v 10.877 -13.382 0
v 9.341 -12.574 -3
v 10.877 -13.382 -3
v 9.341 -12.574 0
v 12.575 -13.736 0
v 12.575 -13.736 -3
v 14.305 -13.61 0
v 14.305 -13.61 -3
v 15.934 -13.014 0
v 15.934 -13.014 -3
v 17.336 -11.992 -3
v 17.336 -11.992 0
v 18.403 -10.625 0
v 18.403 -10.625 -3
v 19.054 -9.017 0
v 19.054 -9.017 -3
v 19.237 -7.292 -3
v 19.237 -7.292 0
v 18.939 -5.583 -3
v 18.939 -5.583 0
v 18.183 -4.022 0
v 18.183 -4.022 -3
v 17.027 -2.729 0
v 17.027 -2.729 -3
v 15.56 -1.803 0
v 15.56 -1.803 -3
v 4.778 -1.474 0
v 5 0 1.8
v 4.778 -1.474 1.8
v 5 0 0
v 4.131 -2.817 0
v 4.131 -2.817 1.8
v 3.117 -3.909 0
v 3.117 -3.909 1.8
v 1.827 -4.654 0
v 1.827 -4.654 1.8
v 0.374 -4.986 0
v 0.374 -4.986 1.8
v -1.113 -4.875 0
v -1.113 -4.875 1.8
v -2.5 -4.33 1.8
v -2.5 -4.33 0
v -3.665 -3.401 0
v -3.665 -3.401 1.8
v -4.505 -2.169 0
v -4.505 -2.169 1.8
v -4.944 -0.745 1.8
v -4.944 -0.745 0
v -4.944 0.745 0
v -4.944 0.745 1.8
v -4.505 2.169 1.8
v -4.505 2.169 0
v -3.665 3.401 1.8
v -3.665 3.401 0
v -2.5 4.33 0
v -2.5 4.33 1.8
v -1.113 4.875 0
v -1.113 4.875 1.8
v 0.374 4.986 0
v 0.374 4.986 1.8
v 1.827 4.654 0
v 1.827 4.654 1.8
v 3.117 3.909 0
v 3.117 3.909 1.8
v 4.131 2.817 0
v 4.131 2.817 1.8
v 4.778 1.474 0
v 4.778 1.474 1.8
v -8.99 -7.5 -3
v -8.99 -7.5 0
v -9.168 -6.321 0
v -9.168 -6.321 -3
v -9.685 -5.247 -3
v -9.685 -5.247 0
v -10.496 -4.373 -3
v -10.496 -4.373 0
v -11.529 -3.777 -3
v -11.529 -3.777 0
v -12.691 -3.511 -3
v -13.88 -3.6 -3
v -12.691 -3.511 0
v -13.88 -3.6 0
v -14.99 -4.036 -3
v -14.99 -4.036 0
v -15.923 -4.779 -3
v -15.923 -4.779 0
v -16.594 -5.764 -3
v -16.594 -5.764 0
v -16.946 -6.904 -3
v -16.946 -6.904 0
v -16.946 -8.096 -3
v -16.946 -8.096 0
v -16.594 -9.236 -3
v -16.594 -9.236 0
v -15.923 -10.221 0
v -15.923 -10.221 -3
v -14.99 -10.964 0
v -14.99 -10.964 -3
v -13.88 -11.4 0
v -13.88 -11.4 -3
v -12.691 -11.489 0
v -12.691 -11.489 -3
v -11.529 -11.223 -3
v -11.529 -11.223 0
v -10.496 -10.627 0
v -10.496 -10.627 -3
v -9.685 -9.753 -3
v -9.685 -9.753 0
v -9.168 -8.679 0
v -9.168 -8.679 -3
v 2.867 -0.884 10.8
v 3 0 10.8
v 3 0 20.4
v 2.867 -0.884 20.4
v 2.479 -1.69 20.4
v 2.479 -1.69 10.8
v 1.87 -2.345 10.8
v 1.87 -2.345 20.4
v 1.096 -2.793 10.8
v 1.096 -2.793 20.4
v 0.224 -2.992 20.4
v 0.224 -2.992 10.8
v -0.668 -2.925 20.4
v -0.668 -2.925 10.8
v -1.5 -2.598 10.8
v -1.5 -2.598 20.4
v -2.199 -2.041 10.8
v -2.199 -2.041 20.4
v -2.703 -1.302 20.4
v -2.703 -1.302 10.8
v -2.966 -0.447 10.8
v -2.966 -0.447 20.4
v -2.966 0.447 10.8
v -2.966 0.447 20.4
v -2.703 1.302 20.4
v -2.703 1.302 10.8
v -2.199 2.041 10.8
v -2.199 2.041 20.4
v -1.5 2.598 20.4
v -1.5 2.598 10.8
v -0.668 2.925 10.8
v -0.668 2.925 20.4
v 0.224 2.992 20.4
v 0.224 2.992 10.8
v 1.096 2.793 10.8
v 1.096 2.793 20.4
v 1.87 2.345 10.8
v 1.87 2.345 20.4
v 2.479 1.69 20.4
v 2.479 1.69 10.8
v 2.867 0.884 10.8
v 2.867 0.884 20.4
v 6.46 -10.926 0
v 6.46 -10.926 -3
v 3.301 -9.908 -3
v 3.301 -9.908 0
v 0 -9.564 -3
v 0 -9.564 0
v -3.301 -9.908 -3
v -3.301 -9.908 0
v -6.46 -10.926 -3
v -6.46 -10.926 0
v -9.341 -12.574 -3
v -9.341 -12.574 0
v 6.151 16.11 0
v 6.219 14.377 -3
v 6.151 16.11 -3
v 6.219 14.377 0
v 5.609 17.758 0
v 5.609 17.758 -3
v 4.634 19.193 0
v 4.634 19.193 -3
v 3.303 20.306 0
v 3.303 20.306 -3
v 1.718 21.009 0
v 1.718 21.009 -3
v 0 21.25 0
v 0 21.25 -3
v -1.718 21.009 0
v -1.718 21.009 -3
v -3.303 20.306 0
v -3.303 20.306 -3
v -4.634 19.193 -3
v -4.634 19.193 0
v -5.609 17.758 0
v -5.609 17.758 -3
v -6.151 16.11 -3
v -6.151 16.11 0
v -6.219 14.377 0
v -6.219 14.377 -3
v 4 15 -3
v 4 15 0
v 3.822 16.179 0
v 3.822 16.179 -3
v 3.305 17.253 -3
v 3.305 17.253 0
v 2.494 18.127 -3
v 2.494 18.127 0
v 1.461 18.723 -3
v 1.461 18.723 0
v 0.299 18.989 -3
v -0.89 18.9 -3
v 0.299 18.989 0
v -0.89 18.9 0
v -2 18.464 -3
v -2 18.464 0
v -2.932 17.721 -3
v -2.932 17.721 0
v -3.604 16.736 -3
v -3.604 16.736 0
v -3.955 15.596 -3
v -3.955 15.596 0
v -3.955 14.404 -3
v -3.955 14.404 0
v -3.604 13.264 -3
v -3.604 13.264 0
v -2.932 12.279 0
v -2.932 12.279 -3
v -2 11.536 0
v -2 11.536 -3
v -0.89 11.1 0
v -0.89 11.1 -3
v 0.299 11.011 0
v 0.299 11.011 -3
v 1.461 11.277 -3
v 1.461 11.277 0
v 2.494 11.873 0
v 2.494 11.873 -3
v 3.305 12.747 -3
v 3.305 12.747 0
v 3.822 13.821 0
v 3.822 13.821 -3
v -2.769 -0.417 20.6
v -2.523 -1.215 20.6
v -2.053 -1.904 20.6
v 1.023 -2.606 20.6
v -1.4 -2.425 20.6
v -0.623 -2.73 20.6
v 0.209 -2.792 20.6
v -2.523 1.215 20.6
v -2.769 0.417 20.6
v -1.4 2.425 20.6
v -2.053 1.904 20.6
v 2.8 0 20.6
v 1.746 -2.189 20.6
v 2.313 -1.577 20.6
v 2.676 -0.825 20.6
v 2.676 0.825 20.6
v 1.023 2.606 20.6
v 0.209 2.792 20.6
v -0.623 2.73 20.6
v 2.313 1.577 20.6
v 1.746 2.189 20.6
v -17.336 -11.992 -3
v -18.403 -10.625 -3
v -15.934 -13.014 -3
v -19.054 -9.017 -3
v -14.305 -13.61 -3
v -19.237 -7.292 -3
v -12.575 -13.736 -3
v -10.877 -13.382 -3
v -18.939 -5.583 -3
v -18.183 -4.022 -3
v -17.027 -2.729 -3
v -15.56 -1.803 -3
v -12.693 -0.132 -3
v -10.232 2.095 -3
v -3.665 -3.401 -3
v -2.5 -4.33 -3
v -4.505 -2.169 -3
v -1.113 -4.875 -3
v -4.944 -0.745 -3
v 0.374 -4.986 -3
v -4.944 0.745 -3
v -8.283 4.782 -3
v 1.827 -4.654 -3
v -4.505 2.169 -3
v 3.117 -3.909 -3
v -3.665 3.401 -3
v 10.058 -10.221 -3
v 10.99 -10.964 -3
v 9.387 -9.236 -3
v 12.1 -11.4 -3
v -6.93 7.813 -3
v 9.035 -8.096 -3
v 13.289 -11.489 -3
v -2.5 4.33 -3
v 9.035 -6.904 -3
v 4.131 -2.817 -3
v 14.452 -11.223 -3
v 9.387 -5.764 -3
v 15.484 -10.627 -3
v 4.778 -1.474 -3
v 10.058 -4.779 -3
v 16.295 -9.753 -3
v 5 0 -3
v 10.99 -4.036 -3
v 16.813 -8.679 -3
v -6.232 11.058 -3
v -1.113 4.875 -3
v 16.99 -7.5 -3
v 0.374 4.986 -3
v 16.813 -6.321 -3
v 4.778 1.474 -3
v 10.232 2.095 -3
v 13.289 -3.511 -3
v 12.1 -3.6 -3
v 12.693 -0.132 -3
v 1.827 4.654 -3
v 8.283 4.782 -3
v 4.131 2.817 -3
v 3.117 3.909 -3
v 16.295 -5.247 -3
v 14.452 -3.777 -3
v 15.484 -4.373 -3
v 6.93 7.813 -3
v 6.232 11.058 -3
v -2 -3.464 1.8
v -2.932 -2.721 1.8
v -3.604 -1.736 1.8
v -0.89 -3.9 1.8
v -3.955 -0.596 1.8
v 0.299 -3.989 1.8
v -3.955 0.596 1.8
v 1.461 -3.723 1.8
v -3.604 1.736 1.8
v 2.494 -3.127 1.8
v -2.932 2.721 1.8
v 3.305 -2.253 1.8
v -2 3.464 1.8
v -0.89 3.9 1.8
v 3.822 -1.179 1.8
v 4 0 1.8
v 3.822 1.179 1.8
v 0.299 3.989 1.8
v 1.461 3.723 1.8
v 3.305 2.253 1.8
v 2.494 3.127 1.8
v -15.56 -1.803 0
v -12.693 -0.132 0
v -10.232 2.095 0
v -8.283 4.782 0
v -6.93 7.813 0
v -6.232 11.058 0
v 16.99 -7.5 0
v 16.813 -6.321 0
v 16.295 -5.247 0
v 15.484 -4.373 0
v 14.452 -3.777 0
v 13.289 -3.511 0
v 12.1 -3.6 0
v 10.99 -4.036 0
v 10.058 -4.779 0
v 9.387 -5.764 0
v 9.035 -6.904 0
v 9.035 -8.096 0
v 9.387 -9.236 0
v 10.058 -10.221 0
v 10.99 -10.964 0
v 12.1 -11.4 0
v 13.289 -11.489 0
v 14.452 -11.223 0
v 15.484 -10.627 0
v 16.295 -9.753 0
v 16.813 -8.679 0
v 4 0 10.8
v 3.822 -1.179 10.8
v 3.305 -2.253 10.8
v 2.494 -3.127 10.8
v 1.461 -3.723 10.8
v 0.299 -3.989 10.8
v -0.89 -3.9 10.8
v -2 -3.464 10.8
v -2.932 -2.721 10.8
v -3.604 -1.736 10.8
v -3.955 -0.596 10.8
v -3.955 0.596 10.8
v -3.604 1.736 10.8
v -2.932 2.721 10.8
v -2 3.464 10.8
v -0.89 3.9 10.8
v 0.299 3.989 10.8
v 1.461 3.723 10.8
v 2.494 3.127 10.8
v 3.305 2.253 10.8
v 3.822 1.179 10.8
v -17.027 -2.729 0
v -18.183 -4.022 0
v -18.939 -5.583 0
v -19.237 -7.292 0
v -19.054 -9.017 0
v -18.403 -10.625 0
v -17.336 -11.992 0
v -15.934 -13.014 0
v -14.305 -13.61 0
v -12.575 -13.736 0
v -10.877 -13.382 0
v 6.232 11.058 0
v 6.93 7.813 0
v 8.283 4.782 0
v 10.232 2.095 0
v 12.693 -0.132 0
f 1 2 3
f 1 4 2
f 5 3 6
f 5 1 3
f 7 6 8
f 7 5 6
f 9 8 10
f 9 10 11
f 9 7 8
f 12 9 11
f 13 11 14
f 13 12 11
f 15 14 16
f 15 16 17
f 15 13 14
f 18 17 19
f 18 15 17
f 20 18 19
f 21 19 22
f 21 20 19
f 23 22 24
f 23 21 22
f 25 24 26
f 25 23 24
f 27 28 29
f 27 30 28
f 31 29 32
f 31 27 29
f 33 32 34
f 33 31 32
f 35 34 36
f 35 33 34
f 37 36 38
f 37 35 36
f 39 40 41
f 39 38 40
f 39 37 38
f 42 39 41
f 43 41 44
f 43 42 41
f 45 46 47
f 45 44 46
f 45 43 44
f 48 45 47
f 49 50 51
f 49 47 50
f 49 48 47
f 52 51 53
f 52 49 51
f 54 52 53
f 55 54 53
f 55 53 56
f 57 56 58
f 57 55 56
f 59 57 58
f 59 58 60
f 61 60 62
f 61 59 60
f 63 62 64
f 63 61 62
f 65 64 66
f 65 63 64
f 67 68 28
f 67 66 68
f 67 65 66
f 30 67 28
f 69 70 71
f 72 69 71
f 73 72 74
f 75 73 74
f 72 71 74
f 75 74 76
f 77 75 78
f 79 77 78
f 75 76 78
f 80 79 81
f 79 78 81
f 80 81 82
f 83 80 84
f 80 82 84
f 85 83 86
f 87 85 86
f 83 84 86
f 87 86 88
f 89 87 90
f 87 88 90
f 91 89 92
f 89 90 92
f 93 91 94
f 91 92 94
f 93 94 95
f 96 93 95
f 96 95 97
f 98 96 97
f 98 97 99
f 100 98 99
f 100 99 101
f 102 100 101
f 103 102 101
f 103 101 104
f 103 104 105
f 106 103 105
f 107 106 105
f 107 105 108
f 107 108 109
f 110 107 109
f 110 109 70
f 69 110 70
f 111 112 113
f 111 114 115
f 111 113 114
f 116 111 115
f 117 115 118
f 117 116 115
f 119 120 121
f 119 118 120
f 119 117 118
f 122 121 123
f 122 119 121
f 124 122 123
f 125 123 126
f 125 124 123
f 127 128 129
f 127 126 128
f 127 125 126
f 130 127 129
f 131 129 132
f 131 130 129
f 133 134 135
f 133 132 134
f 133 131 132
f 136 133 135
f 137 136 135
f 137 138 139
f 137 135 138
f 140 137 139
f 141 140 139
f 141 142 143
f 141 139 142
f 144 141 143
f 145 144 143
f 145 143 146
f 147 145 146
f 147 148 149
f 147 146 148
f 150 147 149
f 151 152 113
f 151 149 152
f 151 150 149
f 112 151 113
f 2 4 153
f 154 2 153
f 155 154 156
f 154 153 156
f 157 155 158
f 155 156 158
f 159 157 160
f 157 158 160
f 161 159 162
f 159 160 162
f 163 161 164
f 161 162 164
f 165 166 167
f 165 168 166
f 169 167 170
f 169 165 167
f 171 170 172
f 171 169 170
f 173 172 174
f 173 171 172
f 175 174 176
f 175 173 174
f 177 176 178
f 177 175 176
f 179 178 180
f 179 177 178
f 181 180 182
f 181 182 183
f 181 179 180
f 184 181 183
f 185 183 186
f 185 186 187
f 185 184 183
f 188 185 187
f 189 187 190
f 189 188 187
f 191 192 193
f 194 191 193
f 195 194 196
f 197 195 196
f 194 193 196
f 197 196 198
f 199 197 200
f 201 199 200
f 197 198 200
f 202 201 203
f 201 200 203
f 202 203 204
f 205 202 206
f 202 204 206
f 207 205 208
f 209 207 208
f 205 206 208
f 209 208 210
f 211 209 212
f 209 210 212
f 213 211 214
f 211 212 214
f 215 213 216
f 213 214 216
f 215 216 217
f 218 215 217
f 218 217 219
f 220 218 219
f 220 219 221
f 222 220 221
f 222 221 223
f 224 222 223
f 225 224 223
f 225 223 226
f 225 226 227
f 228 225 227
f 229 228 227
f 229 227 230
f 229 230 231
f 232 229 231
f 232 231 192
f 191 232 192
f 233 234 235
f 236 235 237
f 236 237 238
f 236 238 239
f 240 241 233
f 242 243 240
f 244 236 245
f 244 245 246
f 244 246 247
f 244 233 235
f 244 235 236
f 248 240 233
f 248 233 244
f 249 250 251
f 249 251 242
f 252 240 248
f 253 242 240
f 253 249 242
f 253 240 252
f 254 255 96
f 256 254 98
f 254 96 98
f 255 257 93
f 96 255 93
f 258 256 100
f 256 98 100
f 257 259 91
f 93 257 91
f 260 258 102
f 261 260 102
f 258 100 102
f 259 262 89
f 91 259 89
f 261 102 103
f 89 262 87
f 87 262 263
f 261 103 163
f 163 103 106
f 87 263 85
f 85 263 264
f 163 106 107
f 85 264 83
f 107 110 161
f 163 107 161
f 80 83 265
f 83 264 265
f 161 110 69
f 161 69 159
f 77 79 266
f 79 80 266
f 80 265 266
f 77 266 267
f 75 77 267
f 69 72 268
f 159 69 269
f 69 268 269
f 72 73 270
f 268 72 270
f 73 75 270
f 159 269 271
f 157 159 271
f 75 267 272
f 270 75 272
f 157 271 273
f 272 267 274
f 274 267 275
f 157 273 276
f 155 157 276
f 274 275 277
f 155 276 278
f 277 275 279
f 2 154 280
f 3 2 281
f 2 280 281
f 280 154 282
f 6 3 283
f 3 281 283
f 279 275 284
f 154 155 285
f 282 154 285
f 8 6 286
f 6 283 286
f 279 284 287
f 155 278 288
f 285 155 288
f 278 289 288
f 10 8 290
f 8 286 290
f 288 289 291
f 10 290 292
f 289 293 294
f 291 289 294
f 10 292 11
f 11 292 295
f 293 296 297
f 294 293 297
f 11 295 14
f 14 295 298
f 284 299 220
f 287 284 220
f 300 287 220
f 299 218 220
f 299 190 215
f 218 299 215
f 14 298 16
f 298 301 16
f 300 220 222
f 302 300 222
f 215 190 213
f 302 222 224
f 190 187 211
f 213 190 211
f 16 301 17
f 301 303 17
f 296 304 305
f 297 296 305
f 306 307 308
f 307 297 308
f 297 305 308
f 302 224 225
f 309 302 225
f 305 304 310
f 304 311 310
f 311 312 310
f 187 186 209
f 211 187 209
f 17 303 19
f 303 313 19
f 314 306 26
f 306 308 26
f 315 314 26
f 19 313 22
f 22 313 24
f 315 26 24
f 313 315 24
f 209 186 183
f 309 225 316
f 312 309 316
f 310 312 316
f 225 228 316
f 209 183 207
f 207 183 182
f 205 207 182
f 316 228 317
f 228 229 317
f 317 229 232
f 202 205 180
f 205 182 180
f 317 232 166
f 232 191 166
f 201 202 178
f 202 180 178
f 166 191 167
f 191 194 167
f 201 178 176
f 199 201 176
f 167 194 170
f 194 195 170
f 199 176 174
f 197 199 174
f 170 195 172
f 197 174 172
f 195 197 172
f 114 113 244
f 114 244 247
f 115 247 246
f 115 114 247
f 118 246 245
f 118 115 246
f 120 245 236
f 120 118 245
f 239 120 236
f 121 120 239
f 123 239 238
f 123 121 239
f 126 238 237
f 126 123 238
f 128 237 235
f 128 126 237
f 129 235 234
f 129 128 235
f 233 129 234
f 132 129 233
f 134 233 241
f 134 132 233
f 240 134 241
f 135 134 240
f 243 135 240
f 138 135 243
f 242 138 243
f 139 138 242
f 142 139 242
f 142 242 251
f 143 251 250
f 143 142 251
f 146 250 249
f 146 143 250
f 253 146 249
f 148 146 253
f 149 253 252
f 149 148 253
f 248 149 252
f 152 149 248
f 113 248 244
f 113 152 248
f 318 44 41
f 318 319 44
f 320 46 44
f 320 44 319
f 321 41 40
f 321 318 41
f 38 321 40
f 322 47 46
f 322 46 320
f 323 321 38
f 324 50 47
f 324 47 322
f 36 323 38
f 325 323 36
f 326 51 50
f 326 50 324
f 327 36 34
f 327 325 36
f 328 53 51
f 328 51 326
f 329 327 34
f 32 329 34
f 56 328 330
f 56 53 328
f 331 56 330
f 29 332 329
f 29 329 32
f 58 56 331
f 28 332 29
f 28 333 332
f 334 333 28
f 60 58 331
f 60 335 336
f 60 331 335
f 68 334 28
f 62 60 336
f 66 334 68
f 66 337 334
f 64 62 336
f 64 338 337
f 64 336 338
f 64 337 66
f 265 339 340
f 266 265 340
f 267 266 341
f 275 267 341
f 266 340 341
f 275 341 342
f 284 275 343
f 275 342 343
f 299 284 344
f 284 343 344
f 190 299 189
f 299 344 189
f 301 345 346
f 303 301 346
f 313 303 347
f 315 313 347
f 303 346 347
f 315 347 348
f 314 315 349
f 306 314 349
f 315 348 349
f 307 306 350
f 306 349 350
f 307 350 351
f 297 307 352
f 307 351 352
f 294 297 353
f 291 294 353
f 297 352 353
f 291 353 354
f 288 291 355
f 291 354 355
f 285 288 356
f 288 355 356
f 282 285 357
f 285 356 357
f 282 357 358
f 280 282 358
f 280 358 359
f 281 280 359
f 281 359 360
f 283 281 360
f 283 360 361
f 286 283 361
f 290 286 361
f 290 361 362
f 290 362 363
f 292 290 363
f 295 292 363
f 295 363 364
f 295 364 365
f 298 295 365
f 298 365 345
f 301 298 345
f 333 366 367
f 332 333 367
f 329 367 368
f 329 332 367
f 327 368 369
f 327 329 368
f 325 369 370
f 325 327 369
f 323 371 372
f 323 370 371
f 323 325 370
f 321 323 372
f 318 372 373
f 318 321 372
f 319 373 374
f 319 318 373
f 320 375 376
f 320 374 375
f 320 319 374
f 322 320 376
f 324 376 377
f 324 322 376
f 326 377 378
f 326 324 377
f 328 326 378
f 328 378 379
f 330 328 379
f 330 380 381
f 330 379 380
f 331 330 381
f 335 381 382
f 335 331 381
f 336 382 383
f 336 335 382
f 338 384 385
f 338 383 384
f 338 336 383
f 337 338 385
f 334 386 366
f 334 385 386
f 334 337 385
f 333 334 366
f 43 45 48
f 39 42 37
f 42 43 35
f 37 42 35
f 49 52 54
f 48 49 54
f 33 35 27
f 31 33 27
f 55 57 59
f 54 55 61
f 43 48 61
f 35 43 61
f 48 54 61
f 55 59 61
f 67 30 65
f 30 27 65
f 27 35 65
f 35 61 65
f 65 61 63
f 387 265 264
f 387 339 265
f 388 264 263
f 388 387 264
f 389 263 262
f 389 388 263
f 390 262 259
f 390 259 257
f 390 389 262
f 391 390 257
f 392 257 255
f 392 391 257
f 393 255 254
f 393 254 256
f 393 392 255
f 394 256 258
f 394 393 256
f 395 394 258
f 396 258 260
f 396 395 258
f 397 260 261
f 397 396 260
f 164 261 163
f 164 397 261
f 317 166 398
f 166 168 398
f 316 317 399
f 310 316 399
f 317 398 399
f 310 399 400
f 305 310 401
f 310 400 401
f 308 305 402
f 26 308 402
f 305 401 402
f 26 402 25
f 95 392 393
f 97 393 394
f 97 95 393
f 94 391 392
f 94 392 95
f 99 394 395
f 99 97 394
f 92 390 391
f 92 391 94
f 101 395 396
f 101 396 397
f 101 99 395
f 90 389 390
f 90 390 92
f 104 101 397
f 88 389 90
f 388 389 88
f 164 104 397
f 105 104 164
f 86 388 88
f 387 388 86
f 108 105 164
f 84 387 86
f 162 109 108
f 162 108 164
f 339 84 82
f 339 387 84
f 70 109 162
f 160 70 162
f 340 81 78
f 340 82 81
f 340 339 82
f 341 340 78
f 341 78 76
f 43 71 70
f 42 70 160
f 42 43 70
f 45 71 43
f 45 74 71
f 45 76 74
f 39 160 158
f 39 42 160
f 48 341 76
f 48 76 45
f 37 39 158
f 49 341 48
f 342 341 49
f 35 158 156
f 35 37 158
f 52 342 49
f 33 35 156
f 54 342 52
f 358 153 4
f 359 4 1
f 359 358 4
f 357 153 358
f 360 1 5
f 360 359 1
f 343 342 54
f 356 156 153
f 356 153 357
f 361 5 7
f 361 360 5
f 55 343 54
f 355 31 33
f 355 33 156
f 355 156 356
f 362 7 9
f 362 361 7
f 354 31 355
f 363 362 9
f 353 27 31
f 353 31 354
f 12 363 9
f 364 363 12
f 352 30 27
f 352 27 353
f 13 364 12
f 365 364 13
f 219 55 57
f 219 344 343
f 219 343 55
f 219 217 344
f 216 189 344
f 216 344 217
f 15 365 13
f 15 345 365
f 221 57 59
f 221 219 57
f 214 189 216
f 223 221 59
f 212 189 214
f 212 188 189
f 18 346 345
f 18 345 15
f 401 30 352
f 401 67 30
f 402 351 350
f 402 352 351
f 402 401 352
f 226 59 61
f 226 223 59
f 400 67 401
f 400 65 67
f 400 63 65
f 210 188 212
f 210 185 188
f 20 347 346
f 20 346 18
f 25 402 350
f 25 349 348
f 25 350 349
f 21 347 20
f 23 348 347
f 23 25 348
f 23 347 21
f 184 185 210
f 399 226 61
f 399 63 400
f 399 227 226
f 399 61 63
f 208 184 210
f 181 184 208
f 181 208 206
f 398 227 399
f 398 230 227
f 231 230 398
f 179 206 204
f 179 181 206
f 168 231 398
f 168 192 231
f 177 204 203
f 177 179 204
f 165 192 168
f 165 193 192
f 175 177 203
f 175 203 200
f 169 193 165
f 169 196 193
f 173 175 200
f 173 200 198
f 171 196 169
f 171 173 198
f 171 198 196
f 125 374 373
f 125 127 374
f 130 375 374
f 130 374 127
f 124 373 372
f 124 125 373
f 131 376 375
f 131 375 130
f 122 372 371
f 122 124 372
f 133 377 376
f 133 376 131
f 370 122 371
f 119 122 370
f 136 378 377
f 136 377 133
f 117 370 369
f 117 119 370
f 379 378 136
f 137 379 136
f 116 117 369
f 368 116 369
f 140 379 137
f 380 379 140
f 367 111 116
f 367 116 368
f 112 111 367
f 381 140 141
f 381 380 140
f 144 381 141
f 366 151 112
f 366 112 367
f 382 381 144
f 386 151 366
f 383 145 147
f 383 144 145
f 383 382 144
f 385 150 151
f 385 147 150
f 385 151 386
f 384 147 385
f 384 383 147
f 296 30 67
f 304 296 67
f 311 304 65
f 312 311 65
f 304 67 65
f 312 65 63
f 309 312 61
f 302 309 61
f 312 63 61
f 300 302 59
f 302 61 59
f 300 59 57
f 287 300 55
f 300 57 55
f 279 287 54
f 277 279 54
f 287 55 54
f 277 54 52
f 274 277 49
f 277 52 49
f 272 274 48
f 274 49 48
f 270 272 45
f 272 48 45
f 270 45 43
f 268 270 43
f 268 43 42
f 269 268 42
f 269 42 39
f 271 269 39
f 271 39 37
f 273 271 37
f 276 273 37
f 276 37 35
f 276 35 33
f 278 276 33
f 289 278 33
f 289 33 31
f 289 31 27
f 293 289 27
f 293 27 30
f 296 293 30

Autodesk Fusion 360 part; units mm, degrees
sketch "Sketch1" plane through (0, 0, 0) normal (0, 0, 1) x (1, 0, 0)
  circle A0 centre (0, 0) radius 4
  circle A1 centre (0, 0) radius 5
  circle A2 centre (0, 15) radius 4
  circle A3 centre (-12.9904, -7.5) radius 4
  circle A4 centre (12.9904, -7.5) radius 4
  arc A5 (-15.5603, -1.8028) -> (-6.2189, 14.377) centre (-22.1392, 12.7821) ccw
  arc A6 (6.2189, 14.377) -> (15.5603, -1.8028) centre (22.1392, 12.7821) ccw
  arc A7 (6.2189, 14.377) -> (-6.2189, 14.377) centre (0, 15) ccw
  arc A8 (-15.5603, -1.8028) -> (-9.3414, -12.5742) centre (-12.9904, -7.5) ccw
  arc A9 (9.3414, -12.5742) -> (15.5603, -1.8028) centre (12.9904, -7.5) ccw
  arc A10 (9.3414, -12.5742) -> (-9.3414, -12.5742) centre (0, -25.5641) ccw
  circle A11 centre (0, 0) radius 3
  dimension "d1" = 8
  dimension "d2" = 10
  dimension "d3" = 12.5
  dimension "d4" = 15
  dimension "d5" = 8
  dimension "d7" = 360
  dimension "d8" = 32
  dimension "d9" = 32
  dimension "d10" = 32
  dimension "d11" = 6
extrude "Extrude1" add sketch "Sketch1" along normal blind 20.6 contours A11 makes body 1
extrude "Extrude2" add sketch "Sketch1" along normal blind 10.8 contours A0 bodies 1
extrude "Extrude3" add sketch "Sketch1" along normal blind 1.8 contours A1 bodies 1
extrude "Extrude4" add sketch "Sketch1" against normal blind 3 separate body contours A5 A6 A7 A8 A9 A10 makes body 2
chamfer "Chamfer1" distance 0.2 distance2 0.2 1 edges at (-2.797, -1.0848, 20.6) measured on face at (-1.1591, 0.5829, 20.6) on bodies 1
equation "d12 = 9.8 mm + 9 mm + 1.8 mm"
equation "d14 = 9 mm + 1.8 mm"
